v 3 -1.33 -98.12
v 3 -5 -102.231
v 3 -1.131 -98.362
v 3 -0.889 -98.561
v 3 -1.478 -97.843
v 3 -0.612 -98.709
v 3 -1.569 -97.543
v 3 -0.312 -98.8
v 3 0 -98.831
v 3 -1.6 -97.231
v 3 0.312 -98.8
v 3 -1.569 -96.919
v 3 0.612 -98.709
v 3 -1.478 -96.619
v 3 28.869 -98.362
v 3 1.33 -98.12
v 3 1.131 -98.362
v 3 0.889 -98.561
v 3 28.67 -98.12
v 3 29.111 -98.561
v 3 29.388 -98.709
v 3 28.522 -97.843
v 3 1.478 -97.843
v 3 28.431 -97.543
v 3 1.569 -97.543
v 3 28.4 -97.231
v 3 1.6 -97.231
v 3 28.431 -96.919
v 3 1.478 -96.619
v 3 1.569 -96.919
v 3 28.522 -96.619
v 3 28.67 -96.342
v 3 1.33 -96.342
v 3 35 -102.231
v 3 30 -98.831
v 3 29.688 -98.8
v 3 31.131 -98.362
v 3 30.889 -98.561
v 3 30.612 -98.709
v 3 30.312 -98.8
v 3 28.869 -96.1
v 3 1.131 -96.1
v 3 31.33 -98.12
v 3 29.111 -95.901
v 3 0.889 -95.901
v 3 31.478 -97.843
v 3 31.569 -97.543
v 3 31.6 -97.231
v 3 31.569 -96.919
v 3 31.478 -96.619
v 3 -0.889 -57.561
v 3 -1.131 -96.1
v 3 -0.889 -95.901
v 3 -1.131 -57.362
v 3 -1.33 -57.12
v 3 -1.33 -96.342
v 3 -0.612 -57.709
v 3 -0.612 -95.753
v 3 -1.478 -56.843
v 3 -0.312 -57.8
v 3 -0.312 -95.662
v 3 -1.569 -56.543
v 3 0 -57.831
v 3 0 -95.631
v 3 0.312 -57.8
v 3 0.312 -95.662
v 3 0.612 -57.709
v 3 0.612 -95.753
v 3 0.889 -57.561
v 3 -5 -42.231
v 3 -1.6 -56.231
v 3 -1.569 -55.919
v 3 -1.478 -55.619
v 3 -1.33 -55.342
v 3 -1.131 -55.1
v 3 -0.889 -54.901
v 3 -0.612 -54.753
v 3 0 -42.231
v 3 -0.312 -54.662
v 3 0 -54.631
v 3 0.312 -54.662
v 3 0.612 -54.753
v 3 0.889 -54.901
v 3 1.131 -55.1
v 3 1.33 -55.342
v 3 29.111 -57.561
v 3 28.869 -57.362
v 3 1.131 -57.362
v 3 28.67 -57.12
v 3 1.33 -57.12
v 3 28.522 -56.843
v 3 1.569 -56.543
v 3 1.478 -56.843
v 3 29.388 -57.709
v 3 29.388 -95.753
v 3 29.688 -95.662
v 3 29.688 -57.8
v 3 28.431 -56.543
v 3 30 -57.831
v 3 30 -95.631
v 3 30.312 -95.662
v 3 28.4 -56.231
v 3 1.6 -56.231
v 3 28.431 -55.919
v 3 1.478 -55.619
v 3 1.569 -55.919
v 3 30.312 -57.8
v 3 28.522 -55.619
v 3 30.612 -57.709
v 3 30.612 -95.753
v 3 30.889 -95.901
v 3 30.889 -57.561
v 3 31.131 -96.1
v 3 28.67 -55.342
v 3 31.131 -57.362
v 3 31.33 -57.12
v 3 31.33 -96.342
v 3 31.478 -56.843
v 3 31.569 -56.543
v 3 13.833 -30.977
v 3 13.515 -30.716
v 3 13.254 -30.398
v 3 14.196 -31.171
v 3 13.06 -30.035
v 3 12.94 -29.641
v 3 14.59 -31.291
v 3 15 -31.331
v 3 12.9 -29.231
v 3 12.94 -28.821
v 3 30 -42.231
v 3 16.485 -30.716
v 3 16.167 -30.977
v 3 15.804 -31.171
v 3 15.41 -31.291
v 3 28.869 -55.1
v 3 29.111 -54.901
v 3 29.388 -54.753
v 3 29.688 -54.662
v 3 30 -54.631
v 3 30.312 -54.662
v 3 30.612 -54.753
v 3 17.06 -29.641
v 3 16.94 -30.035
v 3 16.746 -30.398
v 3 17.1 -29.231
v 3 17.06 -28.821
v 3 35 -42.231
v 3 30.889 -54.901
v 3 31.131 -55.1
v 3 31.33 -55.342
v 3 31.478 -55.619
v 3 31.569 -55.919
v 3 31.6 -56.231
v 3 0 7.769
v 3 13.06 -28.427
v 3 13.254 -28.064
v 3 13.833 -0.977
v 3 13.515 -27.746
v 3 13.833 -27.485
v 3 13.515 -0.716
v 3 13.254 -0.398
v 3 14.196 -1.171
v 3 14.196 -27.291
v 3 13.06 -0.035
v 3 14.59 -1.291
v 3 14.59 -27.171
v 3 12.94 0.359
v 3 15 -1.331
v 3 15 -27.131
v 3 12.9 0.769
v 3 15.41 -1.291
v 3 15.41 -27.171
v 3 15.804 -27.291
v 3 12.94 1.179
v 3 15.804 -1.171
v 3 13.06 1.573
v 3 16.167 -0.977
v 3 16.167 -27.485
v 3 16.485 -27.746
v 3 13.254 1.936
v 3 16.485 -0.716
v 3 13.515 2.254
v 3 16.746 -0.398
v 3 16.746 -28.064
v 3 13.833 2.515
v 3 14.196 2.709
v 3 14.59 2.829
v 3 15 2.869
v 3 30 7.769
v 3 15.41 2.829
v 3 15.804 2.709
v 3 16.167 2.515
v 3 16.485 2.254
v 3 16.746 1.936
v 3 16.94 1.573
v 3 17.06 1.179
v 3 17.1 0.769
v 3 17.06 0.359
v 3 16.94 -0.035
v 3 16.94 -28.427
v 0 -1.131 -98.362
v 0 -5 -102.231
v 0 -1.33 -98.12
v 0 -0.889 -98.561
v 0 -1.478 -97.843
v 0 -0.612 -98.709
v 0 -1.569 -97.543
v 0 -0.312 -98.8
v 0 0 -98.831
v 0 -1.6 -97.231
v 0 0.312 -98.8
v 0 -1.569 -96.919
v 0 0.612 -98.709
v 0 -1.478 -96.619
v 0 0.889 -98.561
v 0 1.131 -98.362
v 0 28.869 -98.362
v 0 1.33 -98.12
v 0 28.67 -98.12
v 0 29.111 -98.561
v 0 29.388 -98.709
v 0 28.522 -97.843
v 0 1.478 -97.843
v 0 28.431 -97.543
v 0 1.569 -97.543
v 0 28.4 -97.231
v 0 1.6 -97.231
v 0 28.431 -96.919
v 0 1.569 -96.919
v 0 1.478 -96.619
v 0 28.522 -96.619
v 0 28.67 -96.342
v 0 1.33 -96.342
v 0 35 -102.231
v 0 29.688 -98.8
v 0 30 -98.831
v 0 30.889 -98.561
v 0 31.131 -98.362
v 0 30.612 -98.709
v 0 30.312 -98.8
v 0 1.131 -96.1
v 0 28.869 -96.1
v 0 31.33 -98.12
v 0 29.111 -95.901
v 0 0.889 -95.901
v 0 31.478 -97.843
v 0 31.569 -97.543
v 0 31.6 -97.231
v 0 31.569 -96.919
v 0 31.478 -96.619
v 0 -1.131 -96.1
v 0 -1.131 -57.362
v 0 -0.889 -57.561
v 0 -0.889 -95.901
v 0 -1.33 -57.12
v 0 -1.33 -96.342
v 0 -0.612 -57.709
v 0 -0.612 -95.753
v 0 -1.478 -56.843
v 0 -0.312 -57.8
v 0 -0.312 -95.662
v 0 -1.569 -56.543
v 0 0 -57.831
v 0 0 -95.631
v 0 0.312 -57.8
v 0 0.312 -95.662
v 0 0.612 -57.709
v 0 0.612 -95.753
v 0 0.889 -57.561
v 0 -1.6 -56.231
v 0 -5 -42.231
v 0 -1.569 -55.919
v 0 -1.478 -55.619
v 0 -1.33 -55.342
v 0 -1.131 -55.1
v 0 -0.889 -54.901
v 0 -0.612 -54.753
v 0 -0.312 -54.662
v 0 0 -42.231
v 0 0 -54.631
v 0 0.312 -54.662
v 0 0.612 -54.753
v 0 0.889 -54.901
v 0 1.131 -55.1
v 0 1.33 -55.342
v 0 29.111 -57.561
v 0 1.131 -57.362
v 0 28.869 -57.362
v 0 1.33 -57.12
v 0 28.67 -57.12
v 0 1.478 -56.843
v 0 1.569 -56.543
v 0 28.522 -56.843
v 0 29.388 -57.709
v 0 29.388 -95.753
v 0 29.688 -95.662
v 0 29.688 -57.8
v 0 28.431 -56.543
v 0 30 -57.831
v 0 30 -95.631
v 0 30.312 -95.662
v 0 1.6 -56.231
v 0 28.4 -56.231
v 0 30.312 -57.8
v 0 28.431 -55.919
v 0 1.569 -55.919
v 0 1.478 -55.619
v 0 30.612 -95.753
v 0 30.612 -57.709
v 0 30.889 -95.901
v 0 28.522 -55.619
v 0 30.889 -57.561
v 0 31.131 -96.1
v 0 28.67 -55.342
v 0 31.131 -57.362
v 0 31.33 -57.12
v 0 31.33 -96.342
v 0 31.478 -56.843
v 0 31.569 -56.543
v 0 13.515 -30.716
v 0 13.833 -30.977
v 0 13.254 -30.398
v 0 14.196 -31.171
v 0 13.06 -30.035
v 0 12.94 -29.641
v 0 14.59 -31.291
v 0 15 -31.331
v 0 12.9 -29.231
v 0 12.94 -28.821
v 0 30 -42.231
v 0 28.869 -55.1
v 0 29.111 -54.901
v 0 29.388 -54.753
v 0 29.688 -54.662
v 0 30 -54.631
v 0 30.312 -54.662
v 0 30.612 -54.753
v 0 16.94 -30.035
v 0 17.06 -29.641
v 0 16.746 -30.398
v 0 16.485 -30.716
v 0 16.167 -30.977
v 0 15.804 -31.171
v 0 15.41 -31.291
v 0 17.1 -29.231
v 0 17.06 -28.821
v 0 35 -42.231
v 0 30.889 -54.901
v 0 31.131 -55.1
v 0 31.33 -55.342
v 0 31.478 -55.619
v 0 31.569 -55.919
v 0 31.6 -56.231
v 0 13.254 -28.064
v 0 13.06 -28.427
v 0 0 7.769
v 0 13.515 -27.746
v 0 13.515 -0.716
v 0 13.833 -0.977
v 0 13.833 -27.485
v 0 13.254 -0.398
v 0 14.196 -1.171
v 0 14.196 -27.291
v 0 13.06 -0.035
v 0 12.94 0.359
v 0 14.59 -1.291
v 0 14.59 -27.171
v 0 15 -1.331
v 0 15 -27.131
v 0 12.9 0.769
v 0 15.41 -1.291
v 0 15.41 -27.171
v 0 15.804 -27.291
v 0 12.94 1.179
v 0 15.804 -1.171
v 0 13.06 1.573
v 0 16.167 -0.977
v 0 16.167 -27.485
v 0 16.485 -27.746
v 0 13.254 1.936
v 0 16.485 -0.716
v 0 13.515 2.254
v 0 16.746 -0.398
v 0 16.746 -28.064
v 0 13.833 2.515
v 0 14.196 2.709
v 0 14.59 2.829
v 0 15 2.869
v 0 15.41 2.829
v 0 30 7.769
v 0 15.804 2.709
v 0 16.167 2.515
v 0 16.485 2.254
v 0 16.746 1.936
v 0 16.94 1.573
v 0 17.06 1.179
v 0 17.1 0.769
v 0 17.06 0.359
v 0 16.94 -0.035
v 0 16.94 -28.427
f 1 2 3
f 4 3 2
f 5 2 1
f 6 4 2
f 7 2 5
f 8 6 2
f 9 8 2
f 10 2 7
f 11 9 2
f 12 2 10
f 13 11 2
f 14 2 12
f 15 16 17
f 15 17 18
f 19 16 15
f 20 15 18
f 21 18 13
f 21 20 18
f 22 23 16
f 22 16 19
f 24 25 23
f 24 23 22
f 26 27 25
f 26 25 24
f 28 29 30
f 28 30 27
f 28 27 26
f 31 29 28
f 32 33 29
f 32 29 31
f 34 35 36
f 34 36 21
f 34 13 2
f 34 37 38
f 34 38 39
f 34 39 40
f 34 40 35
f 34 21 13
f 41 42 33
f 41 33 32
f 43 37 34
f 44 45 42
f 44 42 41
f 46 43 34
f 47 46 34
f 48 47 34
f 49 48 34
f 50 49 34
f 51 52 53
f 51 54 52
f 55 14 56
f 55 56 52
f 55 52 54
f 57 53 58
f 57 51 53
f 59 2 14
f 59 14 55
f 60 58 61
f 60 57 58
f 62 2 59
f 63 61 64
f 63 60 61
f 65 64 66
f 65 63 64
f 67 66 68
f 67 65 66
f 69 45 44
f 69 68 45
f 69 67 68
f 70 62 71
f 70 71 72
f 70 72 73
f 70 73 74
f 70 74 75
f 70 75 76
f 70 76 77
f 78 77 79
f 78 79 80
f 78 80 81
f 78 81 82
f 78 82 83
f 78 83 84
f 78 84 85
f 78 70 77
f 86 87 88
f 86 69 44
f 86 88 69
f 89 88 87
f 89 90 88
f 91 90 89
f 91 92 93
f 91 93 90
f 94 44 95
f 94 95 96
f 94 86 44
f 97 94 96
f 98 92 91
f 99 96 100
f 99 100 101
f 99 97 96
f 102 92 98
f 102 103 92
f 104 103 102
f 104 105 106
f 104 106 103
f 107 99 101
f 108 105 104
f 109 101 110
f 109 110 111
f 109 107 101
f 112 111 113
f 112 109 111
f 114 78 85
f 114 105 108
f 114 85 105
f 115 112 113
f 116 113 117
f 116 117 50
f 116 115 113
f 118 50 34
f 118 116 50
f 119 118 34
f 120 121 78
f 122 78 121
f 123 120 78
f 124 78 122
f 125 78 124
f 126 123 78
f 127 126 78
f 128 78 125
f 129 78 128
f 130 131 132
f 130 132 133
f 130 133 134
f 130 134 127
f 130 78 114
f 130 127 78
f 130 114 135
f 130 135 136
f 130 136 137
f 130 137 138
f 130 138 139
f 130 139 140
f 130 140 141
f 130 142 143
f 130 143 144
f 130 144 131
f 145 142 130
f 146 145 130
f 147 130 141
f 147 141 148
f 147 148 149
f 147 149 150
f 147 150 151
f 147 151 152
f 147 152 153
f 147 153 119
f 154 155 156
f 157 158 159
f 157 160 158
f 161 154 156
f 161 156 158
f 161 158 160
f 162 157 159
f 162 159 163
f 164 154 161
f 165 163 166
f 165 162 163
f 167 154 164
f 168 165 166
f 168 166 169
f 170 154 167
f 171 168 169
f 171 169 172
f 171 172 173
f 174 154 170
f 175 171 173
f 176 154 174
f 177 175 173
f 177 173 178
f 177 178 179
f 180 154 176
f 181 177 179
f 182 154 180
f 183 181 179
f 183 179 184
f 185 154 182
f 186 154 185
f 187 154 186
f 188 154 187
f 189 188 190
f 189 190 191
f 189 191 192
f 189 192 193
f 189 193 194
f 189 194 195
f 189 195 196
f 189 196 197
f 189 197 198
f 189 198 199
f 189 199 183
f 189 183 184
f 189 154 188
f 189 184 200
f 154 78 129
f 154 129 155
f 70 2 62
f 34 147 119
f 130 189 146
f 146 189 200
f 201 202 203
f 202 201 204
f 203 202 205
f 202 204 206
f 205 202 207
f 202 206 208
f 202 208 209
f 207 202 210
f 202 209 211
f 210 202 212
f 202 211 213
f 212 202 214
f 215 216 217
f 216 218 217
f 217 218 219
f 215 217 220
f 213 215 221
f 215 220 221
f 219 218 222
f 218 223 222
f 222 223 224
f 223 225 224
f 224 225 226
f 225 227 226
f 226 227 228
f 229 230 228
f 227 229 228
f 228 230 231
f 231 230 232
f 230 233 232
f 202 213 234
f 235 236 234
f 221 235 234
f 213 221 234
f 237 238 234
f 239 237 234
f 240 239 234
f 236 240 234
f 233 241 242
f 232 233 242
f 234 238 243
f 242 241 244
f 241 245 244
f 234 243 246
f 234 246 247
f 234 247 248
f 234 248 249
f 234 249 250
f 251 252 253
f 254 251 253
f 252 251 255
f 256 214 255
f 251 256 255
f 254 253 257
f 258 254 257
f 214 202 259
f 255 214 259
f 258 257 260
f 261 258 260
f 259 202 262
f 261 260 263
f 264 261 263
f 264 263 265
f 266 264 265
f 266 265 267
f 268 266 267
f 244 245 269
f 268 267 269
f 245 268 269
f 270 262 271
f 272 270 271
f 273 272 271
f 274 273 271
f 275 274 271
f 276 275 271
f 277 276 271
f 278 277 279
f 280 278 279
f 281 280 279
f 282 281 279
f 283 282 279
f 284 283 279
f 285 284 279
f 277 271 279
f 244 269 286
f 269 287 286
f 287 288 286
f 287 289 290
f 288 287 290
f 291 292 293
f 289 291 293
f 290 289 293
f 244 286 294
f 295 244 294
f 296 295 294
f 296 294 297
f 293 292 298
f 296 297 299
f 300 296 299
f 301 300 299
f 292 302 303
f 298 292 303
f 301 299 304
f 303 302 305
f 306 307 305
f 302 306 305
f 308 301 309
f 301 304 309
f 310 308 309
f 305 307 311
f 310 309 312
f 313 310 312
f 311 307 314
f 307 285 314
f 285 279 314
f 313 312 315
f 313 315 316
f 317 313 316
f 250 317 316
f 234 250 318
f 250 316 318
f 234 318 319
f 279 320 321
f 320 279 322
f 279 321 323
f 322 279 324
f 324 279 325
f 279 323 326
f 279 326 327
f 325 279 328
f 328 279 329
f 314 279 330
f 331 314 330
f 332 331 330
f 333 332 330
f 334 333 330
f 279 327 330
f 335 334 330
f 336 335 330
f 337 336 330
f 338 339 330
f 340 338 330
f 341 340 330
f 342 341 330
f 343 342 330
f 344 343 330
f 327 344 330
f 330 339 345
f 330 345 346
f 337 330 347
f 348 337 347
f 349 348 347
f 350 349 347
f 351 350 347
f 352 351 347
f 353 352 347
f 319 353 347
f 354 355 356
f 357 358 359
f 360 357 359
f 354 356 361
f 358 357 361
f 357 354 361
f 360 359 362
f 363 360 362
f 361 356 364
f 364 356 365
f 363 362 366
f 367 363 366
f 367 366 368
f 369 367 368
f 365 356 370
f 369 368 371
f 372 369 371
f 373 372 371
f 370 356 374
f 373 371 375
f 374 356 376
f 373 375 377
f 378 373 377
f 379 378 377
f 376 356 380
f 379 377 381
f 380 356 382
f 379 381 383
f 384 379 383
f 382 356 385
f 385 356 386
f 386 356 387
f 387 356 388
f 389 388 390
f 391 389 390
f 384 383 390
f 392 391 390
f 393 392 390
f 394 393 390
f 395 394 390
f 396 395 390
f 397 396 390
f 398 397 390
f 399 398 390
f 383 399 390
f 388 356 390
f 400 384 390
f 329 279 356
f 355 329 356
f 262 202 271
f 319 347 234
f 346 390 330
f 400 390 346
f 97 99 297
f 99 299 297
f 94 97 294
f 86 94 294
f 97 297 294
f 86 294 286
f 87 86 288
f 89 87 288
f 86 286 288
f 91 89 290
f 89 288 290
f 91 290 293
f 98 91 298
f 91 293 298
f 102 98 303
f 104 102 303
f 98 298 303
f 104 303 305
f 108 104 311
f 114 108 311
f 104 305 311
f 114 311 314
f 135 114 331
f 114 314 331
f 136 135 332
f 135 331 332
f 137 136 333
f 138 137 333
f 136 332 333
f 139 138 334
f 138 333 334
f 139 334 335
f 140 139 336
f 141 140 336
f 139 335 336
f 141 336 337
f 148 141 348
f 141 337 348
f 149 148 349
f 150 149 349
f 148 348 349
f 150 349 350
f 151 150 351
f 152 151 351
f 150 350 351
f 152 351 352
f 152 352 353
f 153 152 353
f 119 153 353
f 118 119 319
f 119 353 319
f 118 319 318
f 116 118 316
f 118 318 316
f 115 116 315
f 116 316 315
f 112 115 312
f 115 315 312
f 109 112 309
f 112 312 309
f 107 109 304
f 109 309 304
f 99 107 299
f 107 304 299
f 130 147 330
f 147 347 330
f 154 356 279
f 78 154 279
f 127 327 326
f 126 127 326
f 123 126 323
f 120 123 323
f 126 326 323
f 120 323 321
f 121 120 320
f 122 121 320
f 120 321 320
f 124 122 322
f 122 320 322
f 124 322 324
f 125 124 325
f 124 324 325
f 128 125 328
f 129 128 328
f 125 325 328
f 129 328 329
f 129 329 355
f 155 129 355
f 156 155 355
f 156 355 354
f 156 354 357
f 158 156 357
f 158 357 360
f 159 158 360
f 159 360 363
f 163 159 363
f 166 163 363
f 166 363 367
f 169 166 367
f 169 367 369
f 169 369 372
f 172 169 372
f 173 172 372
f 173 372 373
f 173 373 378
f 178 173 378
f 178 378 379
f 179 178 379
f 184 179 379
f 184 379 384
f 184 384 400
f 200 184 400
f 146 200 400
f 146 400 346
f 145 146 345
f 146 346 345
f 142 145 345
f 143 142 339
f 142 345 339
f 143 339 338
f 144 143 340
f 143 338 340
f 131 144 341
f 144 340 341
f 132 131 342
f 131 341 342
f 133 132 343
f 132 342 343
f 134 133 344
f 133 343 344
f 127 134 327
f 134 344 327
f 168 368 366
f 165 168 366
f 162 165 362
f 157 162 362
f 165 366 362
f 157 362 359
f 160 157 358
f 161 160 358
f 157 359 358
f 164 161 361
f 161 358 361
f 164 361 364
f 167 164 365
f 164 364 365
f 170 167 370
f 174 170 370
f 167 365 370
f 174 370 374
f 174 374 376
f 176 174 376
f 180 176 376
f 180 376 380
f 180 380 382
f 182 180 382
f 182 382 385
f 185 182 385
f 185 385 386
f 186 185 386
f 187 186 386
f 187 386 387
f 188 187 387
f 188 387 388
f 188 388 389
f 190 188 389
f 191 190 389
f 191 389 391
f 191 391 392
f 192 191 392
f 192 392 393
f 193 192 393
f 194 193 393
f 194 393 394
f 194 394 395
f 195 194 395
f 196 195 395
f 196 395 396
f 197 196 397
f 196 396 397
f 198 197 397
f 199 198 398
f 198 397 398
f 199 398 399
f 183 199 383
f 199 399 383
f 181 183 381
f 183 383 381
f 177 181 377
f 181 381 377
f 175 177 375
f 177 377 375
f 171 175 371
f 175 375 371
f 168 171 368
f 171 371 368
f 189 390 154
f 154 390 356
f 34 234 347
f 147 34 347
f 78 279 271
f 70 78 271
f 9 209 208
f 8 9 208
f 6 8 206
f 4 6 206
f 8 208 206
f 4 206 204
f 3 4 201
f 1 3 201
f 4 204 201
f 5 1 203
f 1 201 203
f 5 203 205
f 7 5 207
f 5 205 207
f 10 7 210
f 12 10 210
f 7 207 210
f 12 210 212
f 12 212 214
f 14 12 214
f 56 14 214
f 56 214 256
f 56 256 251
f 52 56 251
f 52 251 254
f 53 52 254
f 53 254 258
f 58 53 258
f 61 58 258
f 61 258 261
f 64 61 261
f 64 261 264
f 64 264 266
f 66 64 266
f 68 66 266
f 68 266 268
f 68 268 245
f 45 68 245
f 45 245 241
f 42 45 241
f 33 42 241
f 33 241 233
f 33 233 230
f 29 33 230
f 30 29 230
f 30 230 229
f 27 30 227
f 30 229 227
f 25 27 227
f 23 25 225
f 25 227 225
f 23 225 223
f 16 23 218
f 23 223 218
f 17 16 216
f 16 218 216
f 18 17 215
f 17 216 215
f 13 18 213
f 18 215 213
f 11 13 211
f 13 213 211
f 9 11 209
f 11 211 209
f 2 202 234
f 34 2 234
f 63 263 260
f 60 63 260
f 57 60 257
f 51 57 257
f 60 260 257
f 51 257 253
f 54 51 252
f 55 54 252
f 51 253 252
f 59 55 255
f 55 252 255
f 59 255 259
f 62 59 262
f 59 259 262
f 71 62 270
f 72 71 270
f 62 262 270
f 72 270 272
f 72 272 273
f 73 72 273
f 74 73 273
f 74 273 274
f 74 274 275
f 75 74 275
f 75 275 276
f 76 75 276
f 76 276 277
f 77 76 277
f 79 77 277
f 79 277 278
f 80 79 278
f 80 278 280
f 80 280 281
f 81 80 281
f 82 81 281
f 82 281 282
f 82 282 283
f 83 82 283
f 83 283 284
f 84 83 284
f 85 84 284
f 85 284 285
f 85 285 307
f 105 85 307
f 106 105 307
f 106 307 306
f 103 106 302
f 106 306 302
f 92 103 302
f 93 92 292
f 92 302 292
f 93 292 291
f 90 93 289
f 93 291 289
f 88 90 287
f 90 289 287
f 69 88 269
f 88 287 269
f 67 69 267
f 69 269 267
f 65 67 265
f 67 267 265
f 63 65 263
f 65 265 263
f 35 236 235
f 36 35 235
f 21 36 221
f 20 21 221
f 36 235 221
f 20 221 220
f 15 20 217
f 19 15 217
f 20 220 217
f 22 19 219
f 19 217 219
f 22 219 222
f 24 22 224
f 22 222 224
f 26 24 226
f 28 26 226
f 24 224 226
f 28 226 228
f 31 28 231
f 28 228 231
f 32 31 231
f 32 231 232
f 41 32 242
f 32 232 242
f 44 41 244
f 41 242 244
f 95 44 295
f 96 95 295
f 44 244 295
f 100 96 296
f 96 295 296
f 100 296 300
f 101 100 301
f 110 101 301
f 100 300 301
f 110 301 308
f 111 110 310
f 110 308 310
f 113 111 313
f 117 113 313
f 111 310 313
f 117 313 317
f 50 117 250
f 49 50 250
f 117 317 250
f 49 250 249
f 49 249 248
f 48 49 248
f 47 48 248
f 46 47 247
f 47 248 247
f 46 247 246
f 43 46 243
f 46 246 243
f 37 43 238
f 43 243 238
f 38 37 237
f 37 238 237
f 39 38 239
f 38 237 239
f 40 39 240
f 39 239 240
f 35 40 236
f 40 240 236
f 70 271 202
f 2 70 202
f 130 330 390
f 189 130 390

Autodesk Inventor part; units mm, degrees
ref_plane "YZ Plane" through (0, 0, 0) normal (1, 0, 0) x (0, 1, 0)
ref_plane "XZ Plane" through (0, 0, 0) normal (0, 1, 0) x (-1, 0, 0)
ref_plane "XY Plane" through (0, 0, 0) normal (0, 0, 1) x (1, 0, 0)
sketch "スケッチ1" plane through (0, 0, 0) normal (1, 0, 0) x (0, 1, 0)
  line L0 (35, -42.2311) -> (-5, -42.2311)
  line L1 (-5, -42.2311) -> (-5, -102.2311)
  line L2 (-5, -102.2311) -> (35, -102.2311)
  line L3 (35, -102.2311) -> (35, -42.2311)
  line L4 (30, 7.7689) -> (0, 7.7689)
  line L5 (0, 7.7689) -> (0, -42.2311)
  line L6 (0, -42.2311) -> (30, -42.2311)
  line L7 (30, -42.2311) -> (30, 7.7689)
  dimension "d1" = 40
  dimension "d2" = 60
  dimension "d68" = 30
  dimension "d69" = 50
  dimension "d70" = 0
  dimension "d71" = 5
extrude "押し出し1" add sketch "スケッチ1" along normal blind 3
sketch "スケッチ4" plane through (3, 0, 0) normal (1, 0, 0) x (0, 0, -1)
  line L0 (56.2311, 30) -> (97.2311, 30)
  line L1 (97.2311, 30) -> (97.2311, 0)
  line L2 (97.2311, 0) -> (56.2311, 0)
  line L3 (56.2311, 0) -> (56.2311, 30)
  line L4 (102.2311, 35) -> (42.2311, 35) projected
  line L5 (102.2311, -5) -> (102.2311, 35) projected
  point P0 (0, 0)
  dimension "d29" = 41
  dimension "d30" = 30
  dimension "d31" = 5
  dimension "d32" = 5
hole "穴2" at (3, 30, -56.2311) at (3, 0, -56.2311) at (3, 0, -97.2311) at (3, 30, -97.2311) direction (-1, 0, 0) diameter 3.2 end through all
sketch "スケッチ7" plane through (3, 0, 0) normal (1, 0, 0) x (0, 0, -1)
  line L0 (102.2311, -5) -> (102.2311, 35) projected
  line L1 (102.2311, 15) -> (-7.7689, 15)
  line L2 (-7.7689, 30) -> (-7.7689, 0) projected
  point P0 (0, 0)
  point P1 (-0.7689, 15)
  point P2 (29.2311, 15)
  dimension "d72" = 7
  dimension "d73" = 30
hole "穴5" at (3, 15, 0.7689) at (3, 15, -29.2311) direction (-1, 0, 0) diameter 4.2 end through all
properties part number "link4_plate1" material "アルミニウム 6061"
